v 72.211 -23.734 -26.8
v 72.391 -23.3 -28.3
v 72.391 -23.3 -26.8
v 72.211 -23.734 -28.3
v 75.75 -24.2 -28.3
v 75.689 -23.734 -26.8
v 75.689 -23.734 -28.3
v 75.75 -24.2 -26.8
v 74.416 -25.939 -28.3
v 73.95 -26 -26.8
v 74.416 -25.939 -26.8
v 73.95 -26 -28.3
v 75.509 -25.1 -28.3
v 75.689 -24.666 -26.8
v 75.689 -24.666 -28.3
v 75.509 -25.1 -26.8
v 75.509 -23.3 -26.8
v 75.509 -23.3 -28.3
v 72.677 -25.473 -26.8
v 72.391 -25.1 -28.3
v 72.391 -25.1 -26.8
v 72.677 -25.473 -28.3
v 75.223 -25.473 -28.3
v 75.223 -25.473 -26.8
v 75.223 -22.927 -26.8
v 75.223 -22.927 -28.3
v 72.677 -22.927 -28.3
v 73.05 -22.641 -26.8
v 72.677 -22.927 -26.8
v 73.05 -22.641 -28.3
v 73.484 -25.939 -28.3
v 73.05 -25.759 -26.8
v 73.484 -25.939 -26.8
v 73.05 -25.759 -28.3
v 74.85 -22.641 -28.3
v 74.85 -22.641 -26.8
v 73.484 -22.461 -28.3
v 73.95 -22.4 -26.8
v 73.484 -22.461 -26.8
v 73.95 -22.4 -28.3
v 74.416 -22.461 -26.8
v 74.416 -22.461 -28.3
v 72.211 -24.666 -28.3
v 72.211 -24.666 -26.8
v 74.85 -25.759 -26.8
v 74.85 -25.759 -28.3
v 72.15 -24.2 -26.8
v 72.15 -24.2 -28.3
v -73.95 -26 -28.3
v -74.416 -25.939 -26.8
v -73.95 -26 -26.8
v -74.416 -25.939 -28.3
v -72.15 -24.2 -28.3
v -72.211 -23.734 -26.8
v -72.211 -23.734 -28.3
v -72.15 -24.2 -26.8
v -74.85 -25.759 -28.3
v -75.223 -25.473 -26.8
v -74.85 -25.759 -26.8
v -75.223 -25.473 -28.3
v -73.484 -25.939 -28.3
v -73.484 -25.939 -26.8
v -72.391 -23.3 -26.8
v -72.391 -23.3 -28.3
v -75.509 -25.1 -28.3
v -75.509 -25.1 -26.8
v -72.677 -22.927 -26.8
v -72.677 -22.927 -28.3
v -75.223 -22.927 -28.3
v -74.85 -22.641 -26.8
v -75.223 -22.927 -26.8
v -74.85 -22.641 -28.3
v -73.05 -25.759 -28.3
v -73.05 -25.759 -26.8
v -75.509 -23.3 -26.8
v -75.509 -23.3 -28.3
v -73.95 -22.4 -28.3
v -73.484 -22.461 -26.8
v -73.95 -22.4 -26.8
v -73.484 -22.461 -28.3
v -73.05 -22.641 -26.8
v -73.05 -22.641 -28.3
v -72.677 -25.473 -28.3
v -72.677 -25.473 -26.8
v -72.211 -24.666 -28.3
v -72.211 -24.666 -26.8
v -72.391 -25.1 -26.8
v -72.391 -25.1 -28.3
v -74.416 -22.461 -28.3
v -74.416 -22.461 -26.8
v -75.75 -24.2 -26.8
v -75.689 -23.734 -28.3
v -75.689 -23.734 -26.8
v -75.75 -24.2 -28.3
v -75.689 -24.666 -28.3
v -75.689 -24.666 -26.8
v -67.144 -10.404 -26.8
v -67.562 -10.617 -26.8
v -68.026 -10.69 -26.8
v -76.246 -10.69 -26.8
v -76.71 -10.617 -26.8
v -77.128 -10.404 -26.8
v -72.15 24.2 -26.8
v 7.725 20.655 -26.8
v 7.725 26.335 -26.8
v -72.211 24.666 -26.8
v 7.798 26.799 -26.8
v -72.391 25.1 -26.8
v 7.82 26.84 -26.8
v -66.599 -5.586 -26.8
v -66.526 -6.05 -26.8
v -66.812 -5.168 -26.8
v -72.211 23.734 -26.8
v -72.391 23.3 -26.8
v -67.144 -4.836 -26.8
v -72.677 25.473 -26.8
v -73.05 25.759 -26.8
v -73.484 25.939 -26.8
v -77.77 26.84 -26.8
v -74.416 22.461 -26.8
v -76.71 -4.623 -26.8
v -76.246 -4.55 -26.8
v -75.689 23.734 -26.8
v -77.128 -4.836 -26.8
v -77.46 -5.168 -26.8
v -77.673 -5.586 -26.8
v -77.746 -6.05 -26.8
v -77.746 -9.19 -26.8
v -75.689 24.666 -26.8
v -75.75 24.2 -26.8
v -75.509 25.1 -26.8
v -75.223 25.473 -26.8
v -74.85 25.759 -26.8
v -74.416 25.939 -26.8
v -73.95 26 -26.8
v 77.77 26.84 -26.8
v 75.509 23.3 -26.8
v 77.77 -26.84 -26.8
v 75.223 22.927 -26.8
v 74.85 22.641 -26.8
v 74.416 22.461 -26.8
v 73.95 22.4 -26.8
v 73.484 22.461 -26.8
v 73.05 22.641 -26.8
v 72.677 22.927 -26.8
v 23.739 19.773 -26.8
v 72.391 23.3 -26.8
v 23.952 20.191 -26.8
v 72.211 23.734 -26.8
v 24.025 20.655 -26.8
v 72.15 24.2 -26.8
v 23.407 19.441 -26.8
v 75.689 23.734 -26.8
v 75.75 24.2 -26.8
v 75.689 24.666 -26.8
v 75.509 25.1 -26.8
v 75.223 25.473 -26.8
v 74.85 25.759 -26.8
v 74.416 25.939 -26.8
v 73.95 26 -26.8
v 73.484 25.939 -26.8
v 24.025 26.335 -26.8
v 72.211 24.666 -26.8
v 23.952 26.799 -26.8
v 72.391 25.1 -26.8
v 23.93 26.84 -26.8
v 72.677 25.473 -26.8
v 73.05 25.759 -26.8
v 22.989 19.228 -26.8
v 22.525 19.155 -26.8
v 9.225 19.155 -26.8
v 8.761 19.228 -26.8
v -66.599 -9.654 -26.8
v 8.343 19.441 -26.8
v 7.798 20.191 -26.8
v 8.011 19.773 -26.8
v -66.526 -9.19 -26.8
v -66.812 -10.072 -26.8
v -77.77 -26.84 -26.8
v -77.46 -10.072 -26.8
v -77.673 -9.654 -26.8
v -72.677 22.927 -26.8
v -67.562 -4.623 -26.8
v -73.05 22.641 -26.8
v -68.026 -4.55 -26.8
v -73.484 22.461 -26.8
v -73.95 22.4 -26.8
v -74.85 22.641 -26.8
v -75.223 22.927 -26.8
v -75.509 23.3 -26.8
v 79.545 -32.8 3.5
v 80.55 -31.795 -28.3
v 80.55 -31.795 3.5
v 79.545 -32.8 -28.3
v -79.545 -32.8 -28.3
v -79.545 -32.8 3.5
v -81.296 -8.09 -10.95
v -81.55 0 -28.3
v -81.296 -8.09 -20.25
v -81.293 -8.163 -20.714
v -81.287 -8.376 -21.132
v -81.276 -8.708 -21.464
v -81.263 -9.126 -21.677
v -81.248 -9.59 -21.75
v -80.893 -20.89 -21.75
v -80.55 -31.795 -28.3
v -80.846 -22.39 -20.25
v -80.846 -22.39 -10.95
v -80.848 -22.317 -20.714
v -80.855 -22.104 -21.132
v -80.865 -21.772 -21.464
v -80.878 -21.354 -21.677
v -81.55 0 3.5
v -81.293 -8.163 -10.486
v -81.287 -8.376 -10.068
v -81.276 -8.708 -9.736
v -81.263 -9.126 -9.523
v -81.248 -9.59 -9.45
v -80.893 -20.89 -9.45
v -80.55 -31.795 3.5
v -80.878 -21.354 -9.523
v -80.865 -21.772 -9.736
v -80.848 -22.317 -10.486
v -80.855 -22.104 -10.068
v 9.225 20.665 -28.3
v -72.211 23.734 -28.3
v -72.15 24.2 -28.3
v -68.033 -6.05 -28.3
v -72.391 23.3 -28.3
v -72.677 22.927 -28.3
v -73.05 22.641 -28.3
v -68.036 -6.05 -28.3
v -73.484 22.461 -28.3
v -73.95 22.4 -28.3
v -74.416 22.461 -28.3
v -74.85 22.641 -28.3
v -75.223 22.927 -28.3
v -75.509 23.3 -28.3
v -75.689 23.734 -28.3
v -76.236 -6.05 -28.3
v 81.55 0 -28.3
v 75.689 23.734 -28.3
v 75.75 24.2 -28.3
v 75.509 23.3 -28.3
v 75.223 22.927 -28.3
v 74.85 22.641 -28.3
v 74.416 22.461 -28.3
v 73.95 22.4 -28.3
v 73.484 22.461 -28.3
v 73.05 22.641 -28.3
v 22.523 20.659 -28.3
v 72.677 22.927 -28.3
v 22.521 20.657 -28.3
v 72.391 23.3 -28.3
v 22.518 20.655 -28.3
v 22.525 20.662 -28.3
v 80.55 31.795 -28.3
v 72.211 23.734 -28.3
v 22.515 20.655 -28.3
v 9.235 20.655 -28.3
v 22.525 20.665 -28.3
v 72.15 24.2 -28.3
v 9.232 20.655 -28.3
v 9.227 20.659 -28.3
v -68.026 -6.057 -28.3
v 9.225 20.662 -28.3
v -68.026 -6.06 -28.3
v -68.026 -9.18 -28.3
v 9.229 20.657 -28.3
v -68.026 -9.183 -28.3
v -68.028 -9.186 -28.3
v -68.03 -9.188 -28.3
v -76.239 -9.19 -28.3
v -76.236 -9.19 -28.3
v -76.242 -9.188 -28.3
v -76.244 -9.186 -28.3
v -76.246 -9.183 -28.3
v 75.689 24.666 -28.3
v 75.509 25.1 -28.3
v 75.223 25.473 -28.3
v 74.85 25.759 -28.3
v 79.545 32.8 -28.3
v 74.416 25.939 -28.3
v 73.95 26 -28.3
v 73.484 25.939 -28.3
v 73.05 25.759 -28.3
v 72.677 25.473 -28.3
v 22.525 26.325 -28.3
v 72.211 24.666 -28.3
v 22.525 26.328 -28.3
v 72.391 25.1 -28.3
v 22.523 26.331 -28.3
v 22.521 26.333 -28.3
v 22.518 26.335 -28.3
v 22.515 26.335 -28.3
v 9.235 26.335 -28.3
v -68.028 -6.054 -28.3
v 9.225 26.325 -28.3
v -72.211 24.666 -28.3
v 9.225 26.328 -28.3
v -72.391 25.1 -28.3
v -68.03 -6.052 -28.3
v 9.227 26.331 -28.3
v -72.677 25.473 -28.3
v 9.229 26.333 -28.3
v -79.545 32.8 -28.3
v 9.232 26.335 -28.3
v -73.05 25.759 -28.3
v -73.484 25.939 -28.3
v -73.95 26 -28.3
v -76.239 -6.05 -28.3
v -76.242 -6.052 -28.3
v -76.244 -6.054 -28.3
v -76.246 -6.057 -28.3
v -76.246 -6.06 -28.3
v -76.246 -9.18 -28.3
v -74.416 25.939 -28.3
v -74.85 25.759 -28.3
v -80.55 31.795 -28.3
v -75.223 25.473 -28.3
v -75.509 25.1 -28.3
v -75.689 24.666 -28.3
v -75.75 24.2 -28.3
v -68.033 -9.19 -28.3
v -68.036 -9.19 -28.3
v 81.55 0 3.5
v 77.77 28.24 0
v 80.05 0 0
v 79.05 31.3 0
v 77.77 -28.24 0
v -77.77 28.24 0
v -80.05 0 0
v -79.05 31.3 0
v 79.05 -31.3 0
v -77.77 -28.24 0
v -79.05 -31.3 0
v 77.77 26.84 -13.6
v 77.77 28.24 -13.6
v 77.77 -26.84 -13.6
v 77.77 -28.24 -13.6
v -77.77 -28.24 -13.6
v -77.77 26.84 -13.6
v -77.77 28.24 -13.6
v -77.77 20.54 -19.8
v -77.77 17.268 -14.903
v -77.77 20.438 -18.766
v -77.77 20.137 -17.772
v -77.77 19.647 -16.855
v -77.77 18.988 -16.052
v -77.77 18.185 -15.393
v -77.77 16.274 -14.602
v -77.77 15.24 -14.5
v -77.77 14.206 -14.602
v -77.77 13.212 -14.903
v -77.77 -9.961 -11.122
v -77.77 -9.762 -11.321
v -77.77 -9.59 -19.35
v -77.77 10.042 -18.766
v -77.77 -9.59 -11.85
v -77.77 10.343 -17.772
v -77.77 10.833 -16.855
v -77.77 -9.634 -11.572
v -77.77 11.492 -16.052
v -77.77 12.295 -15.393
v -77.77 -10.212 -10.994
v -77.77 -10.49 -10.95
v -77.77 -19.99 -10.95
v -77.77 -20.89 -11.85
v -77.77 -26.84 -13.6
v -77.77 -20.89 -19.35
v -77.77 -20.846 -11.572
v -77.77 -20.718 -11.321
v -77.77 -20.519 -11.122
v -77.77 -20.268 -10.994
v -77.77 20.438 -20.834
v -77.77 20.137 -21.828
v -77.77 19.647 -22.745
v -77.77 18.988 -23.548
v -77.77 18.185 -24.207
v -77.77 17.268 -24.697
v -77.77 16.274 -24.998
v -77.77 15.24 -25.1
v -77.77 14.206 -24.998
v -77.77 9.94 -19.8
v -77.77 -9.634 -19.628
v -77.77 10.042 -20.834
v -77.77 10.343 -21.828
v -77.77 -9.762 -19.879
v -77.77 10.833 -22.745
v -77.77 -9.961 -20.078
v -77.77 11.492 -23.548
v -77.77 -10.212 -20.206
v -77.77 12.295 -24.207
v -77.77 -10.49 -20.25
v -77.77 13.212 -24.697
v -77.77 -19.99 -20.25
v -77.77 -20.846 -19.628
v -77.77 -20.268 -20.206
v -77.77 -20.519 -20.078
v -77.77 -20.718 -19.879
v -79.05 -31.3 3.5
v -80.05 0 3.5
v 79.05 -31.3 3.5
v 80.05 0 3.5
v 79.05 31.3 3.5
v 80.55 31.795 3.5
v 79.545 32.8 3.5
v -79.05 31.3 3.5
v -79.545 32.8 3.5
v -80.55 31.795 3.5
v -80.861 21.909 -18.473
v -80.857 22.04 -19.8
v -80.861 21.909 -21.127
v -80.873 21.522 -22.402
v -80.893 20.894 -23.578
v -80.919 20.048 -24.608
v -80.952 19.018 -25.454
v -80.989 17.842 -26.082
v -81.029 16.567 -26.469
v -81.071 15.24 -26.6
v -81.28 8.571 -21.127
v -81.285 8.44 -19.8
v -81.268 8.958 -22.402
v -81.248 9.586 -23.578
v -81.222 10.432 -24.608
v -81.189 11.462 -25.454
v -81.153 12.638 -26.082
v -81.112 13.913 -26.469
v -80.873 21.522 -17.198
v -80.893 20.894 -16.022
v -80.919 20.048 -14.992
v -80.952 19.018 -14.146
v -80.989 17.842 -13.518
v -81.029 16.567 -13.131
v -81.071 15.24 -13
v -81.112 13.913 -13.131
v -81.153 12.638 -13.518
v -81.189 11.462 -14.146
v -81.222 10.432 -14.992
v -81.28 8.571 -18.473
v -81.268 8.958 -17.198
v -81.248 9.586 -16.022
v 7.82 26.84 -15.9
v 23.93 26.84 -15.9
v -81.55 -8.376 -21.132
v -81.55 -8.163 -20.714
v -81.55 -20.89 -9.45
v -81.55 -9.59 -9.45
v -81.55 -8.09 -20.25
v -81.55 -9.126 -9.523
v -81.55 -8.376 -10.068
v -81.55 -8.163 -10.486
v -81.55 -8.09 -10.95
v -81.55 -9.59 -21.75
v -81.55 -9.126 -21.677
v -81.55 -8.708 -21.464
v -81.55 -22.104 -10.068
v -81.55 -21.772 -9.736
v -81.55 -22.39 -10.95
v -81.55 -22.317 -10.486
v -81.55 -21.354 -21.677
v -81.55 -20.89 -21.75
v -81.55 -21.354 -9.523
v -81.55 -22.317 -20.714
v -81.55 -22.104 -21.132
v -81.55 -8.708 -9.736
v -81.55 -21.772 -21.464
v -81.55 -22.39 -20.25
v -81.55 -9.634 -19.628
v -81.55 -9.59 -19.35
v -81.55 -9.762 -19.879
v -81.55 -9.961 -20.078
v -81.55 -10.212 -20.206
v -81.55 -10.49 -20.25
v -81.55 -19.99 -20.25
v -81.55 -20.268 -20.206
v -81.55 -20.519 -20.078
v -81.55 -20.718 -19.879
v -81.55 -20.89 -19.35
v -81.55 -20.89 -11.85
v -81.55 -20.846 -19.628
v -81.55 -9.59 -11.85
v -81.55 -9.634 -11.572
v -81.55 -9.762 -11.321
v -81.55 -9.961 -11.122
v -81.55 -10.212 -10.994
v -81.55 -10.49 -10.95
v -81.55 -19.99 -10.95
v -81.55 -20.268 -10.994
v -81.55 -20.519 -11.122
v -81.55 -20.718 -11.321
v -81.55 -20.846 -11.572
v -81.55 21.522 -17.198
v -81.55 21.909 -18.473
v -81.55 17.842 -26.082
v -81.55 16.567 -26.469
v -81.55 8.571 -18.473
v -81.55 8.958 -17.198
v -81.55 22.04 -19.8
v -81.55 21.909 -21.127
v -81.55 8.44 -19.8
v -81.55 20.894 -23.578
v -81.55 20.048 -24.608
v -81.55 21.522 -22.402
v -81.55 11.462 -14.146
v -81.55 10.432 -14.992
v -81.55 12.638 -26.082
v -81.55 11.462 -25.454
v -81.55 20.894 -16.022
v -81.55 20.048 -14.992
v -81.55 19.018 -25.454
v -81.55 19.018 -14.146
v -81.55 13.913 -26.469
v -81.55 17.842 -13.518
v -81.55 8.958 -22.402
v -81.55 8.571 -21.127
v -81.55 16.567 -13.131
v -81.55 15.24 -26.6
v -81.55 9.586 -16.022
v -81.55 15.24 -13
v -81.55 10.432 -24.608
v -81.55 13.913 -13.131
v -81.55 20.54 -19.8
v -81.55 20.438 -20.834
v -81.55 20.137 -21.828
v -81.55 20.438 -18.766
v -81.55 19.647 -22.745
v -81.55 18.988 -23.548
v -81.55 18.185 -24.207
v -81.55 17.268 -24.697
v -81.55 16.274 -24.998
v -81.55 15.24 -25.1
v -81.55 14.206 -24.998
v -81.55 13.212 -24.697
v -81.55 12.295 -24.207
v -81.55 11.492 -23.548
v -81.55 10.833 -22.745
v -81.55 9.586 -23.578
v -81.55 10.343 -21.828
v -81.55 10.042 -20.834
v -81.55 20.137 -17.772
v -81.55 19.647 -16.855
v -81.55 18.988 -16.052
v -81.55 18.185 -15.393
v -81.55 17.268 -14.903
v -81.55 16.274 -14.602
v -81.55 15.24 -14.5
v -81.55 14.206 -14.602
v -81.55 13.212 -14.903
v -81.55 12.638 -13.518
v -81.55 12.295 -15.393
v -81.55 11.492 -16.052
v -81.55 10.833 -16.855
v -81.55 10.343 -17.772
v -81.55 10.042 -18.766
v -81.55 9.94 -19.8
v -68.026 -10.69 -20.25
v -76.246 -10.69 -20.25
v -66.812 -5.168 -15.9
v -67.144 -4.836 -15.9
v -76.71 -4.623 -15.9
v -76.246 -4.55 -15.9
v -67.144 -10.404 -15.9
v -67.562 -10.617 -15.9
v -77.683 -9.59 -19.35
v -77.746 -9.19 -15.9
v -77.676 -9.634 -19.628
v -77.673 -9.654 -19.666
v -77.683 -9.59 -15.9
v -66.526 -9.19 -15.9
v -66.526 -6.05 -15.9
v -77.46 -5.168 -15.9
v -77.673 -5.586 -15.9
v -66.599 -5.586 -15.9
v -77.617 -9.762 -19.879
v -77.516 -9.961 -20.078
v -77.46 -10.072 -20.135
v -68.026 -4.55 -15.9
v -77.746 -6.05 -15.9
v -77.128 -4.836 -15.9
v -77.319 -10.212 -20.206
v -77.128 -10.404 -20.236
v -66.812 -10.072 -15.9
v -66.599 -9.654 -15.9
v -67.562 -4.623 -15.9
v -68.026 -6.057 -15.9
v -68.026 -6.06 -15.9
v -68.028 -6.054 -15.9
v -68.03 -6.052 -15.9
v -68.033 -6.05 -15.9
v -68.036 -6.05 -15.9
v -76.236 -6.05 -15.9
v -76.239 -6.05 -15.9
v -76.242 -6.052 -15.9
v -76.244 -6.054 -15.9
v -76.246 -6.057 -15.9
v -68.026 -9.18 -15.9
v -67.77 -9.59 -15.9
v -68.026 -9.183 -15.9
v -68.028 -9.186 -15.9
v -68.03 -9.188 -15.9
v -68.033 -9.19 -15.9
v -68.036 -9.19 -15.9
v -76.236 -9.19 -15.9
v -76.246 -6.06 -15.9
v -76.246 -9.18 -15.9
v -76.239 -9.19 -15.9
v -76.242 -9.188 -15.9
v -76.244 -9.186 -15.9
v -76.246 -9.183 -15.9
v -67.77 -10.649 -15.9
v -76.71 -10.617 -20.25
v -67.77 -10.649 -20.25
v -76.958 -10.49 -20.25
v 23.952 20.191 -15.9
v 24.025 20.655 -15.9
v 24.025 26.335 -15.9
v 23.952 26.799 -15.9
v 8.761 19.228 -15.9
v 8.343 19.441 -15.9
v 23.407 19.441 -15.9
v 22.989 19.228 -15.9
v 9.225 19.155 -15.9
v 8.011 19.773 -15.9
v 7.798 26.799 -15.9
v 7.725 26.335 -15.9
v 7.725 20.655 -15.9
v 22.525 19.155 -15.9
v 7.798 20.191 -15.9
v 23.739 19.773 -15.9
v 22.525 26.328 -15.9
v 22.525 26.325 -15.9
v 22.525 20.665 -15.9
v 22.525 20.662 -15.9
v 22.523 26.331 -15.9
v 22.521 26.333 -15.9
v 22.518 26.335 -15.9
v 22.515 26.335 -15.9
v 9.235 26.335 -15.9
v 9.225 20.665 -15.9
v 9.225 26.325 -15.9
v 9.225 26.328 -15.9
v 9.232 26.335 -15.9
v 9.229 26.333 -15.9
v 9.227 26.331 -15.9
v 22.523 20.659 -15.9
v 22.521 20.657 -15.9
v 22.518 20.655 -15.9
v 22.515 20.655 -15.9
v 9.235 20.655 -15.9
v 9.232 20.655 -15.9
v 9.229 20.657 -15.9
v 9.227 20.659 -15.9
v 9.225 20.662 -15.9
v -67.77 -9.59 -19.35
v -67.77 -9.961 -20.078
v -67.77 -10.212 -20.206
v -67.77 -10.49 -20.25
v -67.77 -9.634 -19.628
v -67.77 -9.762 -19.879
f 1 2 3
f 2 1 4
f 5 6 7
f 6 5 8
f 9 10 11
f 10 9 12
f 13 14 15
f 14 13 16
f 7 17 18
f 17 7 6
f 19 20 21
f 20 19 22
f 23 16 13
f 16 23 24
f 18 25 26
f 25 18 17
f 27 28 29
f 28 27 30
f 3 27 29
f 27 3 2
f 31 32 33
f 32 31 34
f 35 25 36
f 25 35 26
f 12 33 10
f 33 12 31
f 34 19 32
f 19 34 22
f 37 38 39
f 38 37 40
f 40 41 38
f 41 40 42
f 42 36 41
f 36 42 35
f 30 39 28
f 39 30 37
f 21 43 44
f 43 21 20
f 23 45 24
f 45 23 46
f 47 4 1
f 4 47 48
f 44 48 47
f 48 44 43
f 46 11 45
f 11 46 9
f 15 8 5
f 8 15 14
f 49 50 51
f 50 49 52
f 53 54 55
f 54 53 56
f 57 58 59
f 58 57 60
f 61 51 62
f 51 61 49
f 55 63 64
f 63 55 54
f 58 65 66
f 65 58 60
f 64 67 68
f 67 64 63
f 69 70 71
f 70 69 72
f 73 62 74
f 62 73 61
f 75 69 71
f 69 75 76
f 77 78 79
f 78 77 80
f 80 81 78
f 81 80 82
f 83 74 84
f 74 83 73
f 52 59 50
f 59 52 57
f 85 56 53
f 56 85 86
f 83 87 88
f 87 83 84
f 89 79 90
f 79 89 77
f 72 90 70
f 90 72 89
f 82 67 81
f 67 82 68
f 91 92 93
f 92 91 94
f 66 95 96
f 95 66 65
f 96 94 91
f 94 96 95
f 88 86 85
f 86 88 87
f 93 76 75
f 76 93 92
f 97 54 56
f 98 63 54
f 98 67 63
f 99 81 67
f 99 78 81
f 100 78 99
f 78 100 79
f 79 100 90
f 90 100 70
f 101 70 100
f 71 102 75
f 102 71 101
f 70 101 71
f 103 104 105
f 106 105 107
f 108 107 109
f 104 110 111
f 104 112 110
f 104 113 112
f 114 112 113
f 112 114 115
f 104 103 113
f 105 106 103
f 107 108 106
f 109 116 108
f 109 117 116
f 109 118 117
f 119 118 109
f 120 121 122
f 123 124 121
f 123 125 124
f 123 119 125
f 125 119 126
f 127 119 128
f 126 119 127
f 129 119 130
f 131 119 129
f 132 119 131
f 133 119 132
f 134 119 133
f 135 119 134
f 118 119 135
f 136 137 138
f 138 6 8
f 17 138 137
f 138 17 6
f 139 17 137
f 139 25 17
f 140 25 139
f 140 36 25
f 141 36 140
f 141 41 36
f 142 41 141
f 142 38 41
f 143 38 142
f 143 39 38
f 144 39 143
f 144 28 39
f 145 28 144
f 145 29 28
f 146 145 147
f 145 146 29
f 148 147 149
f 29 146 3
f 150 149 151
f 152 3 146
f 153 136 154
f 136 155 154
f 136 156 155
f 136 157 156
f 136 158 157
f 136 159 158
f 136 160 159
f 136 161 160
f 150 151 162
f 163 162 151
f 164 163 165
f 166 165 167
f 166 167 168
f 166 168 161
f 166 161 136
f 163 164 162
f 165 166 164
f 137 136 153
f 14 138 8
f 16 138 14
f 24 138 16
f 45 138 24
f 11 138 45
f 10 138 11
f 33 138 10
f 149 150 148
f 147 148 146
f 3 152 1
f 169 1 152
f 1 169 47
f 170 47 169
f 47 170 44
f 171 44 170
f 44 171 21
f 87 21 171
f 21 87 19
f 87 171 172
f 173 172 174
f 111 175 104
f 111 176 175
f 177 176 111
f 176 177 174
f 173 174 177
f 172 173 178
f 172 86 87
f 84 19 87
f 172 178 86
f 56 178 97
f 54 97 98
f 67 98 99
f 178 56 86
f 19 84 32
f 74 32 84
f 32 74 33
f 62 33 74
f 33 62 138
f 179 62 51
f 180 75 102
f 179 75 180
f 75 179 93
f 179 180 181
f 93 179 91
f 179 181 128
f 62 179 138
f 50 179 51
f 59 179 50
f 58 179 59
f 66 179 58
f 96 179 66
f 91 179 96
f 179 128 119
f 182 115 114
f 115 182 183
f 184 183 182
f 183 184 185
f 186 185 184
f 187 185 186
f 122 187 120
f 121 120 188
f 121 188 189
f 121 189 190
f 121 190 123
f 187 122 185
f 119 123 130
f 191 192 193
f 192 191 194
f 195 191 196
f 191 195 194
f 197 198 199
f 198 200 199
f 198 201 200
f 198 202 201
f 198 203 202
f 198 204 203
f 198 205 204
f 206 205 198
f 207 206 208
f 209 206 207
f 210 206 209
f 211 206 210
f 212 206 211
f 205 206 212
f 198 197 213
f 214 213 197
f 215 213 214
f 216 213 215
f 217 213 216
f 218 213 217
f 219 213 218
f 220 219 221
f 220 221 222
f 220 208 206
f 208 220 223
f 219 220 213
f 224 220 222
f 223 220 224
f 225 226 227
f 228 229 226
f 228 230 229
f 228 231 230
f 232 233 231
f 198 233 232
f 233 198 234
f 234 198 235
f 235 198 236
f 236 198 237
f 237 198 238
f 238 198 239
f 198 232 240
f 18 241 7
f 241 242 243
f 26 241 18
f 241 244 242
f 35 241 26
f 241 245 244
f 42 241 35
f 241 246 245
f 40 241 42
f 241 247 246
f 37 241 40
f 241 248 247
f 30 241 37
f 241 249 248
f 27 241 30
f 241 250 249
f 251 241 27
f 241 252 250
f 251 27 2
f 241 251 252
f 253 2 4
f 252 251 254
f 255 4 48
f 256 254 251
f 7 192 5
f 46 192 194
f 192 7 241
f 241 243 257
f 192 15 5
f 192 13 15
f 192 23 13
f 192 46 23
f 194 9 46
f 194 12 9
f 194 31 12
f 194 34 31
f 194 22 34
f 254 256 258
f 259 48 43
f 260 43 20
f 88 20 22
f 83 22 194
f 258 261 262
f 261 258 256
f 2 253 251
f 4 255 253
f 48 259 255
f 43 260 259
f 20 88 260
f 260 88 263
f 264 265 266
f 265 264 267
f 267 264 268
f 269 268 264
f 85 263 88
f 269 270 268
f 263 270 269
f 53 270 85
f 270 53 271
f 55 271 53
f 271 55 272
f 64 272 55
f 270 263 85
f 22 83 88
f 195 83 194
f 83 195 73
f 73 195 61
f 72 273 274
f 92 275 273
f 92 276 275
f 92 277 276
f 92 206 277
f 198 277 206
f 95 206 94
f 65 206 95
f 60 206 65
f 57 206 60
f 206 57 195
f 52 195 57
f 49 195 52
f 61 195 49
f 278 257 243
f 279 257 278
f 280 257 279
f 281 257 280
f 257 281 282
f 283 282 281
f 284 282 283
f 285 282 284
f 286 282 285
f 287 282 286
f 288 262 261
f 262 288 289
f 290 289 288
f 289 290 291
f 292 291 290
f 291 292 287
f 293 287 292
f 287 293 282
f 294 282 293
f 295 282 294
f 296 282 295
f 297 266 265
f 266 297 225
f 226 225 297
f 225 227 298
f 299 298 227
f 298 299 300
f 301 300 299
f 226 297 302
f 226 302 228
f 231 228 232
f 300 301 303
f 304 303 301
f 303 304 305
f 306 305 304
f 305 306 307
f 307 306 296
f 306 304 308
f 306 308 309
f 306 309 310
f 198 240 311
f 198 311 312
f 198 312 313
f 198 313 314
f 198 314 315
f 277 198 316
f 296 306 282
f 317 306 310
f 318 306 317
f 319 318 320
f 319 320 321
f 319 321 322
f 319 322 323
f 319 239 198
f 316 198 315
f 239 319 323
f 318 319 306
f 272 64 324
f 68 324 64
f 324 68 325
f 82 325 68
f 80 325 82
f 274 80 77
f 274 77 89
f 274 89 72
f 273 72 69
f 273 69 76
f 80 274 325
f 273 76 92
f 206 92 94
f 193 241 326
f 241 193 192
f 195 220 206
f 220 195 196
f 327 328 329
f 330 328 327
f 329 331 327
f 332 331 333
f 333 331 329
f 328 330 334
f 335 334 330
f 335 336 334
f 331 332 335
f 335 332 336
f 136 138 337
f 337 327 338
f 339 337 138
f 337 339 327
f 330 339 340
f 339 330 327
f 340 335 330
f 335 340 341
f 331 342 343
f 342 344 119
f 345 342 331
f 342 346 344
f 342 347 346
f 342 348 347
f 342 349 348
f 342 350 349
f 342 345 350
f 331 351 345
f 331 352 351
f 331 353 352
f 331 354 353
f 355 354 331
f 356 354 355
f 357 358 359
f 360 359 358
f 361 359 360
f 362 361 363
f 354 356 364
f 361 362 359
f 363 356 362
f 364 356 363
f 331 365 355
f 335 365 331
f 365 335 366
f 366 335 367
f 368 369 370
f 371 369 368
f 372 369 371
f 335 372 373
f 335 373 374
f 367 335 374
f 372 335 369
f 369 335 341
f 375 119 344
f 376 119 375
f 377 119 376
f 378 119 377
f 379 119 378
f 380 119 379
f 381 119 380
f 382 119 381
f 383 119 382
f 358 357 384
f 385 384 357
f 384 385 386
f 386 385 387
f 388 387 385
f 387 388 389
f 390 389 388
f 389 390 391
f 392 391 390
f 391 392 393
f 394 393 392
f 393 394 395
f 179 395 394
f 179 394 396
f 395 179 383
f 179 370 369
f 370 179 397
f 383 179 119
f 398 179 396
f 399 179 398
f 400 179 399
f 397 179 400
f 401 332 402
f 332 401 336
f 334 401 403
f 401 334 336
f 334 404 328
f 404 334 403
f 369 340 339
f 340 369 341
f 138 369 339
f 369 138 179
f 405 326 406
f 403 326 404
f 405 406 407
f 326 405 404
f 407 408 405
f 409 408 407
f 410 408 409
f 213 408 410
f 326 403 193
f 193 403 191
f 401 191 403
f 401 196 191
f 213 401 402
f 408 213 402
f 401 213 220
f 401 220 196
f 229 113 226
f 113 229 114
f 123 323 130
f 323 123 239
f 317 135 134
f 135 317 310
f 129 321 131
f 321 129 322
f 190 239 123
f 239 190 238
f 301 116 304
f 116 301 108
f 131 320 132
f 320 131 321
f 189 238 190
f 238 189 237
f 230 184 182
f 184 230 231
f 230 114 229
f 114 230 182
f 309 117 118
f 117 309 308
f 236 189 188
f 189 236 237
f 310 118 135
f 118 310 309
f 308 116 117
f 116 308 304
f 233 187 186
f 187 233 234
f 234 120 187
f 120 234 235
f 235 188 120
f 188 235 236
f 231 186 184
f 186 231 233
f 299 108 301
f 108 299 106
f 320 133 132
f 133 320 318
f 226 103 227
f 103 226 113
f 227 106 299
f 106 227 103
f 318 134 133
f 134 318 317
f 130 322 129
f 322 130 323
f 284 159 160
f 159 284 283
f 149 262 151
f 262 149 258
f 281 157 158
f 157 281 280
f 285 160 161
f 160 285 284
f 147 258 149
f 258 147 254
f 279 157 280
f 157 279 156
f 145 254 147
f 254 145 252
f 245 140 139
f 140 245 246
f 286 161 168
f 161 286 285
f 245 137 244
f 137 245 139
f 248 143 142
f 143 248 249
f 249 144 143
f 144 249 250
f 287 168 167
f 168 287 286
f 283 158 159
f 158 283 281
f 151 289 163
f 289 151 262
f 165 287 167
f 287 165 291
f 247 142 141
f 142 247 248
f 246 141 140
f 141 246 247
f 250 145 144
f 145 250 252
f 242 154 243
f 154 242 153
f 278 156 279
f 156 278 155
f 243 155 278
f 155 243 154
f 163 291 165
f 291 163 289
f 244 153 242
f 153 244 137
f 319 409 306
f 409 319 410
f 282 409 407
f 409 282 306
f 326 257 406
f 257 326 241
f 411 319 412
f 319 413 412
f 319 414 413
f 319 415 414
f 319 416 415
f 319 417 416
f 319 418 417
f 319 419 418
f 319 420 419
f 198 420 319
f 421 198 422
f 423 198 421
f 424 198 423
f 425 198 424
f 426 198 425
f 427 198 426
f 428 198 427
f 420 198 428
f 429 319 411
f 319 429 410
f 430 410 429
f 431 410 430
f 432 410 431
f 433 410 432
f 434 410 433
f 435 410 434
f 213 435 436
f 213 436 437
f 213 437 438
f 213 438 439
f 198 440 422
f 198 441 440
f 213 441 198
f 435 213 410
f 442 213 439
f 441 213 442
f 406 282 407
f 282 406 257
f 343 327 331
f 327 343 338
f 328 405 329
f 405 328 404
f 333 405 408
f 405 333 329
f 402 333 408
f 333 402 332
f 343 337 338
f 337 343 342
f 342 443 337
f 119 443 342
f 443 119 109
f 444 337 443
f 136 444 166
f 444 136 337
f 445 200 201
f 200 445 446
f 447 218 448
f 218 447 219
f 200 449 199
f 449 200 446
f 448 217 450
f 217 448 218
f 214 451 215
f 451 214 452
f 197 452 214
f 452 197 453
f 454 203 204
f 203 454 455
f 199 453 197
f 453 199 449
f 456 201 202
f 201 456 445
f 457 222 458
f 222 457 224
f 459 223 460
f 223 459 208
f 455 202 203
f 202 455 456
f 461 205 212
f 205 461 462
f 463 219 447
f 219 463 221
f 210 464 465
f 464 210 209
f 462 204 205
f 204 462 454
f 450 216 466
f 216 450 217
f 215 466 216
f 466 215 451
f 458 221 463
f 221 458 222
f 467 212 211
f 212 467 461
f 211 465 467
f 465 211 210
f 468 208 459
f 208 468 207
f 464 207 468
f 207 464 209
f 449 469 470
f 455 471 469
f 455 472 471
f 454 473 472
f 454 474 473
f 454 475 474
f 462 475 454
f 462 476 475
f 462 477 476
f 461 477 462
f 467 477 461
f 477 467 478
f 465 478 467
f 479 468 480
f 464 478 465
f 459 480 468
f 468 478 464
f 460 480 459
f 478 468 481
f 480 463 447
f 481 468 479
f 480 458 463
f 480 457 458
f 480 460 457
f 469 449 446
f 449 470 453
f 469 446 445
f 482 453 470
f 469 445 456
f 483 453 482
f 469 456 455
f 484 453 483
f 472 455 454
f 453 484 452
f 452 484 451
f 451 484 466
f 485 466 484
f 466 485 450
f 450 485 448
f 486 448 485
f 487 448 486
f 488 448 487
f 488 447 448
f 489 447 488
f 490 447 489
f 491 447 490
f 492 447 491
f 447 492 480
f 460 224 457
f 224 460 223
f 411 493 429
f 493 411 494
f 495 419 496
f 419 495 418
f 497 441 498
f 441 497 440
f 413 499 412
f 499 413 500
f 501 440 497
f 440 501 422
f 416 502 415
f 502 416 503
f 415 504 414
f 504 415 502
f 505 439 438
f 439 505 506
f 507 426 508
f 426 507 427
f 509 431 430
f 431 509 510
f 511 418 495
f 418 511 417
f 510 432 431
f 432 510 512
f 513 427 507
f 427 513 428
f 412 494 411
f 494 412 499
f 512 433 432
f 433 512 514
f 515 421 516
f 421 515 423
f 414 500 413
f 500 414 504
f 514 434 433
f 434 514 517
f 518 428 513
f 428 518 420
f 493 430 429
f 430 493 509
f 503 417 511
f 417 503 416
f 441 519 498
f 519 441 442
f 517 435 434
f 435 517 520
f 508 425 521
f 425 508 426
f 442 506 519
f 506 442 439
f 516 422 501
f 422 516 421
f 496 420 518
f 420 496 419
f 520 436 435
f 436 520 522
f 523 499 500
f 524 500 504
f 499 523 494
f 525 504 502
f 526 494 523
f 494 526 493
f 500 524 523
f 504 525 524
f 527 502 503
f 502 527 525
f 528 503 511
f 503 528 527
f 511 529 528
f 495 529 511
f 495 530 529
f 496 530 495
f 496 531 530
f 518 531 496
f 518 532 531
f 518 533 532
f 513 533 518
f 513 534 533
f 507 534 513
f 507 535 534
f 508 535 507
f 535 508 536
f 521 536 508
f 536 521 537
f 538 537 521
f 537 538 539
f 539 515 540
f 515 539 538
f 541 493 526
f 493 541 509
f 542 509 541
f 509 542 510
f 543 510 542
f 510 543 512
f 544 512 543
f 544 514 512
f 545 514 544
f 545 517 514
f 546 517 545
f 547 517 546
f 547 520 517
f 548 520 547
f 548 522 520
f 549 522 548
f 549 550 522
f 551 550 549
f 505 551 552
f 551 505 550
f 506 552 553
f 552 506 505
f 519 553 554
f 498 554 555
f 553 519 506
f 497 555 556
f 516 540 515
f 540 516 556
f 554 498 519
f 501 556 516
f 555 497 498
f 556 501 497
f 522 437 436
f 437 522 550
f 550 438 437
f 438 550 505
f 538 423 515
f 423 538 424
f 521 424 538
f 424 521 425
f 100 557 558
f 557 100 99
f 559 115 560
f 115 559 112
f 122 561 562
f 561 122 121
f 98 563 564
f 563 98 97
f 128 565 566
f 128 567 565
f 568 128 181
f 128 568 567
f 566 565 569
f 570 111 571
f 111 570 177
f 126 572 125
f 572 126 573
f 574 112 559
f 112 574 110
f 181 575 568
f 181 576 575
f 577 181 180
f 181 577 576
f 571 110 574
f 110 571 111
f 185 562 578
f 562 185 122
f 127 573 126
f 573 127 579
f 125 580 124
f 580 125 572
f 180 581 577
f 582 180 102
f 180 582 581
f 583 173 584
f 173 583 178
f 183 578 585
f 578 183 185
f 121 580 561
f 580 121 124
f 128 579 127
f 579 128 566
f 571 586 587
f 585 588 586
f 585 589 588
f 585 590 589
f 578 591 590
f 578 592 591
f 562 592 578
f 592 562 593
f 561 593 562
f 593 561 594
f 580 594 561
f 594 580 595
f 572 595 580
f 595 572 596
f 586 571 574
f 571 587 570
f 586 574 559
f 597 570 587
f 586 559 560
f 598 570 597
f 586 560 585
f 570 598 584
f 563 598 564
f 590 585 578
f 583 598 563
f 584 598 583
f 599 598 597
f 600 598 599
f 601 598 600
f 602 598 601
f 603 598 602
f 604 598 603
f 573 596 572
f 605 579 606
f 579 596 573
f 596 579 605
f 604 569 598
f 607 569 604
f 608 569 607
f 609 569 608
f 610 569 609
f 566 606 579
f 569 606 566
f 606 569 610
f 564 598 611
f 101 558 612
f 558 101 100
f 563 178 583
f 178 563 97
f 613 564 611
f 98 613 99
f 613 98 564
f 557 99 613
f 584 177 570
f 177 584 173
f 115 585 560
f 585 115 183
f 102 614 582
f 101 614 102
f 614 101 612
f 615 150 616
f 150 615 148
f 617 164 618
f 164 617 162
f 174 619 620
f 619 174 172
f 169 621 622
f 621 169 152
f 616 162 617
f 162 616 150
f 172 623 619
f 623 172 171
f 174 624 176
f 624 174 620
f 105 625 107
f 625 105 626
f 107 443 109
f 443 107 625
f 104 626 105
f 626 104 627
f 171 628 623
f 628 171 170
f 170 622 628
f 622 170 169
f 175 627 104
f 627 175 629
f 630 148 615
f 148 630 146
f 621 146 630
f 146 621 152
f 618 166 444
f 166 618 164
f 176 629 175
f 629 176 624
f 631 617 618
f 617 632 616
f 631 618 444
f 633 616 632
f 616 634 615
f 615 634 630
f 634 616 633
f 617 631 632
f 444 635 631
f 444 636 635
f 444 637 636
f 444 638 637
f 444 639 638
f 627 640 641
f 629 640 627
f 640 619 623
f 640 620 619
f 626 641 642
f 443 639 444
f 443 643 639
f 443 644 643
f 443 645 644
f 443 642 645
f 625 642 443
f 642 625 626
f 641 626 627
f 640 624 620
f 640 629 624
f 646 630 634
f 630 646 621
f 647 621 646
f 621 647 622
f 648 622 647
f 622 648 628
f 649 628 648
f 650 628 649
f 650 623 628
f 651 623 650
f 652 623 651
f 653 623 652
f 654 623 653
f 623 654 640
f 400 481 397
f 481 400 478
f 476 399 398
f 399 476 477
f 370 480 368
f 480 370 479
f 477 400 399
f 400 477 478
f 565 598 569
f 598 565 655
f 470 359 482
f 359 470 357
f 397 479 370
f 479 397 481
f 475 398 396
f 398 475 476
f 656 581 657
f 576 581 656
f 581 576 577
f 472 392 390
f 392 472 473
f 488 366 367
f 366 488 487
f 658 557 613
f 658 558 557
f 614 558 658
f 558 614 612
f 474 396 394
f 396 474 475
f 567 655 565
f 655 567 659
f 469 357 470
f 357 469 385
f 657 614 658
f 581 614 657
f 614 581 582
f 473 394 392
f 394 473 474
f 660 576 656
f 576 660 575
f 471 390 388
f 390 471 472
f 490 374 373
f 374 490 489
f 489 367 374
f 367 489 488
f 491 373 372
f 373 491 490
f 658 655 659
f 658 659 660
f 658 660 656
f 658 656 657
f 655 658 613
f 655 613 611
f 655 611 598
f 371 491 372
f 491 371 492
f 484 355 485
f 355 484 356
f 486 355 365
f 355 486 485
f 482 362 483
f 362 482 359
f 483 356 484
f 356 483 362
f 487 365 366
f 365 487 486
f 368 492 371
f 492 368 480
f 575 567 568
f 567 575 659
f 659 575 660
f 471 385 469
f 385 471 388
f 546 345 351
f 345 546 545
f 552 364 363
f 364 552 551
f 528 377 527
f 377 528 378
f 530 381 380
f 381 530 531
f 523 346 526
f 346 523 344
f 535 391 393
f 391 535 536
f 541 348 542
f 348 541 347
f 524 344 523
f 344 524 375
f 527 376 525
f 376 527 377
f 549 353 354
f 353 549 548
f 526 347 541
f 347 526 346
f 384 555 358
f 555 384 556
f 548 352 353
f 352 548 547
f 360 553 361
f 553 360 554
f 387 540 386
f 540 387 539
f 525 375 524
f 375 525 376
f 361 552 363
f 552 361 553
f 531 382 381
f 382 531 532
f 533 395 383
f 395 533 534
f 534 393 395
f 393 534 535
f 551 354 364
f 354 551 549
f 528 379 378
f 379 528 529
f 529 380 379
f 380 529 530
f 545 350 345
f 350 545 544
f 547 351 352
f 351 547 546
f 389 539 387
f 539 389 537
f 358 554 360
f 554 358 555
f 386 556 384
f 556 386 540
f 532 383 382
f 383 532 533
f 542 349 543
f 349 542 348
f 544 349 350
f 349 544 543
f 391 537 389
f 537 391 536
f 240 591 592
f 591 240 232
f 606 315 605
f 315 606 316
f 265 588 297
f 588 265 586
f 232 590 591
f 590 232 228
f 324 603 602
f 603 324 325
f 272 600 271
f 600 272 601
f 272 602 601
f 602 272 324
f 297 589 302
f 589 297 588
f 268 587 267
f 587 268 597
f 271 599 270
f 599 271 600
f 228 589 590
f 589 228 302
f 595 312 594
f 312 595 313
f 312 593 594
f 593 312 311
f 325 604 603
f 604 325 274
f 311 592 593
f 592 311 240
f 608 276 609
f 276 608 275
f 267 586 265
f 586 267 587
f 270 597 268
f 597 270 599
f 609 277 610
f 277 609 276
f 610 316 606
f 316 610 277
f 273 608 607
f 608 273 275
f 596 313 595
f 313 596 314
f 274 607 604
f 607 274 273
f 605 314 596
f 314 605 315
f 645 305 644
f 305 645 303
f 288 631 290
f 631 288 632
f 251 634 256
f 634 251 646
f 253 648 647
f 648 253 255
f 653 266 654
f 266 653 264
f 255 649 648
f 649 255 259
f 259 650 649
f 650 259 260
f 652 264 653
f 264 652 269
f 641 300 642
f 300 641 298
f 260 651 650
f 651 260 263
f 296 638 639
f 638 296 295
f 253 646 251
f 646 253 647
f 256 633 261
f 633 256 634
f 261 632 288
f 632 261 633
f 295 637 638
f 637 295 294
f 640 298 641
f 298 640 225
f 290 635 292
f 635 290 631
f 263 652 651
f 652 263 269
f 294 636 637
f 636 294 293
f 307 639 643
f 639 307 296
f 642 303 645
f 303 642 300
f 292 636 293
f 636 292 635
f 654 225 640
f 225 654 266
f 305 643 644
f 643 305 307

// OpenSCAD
// case for FG085 signal generator
//
// design origin is center inside of front panel

part = "shell";  // [ shell, demo ]
with_tubes = 0; // [ 1:true, 0:false ]
with_u5p = 0; // [ 1:true, 0:false ]
with_u6p = 1; // [ 1:true, 0:false ]
with_pwm = 1; // [ 1:true, 0:false ]
with_usb = 1; // [ 1:true, 0:false ]

/* [Hidden] */
function in2mm(a) = a * 25.4;

panel_width = 157.5; // at base BUG: accurate?
panel_height = 62.0; 
panel_wall = 2.0;
panel_delta_w = 1.0; // extra width at middle of sides
pcb_thickness = 1.6;
pcb_width = in2mm(6.100); 
pcb_height = in2mm(2.200); 
spacer_front = 12.0; // the spacer with the threads, placed behind front panel and pcb
spacer_rear = 13.2; // placed on rear of pcb
panel_dist = spacer_front + pcb_thickness + spacer_rear; // between panels
screw_thread = 3.0;
nut_af = 4.65; // across flats
nut_dia = 5.3; // to clear
screw_dx = 144.3 + 3.6; // mounting hole distances
screw_dy = 44.8 + 3.6;

power_dia = 10.0; // dia of plug body  
power_pos_z = pcb_height/2 - in2mm(0.500); // offset from middle of PCB
power_pos_y = 6.2; // height from PCB surface
usb_width = 11.0; // plug body
usb_height = 9.0; // plug body
usb_pos_z = -(pcb_height/2 - in2mm(0.500)); // offset from middle of PCB
usb_pos_y = 2.0; // height from PCB surface

pwm_pos_z = -(pcb_height/2 - in2mm(0.800)); // offset from middle of PCB
pwm_pos_x = -(pcb_width/2 - in2mm(0.210)); 
u6p_pos_z = pcb_height/2 - in2mm(0.075) - in2mm(0.100);
u6p_pos_x = pcb_width/2 - in2mm(2.675) + in2mm(0.500)/2;
u5p_pos_z = u6p_pos_z;
u5p_pos_x = pcb_width/2 - in2mm(3.500) + in2mm(0.500)/2;

// tunable
support = 0.4; // needs to be wider than nozzle
wall = 1.5;
chamfer = wall*0.67;
tol = 0.3;
d = 0.01;

if (part == "demo") {
    if (false) color([0, 0.5, 0, 0.3]) {
        panel(0); // front
        translate([0, panel_wall+panel_dist, 0]) panel(0); // rear
    }
    shell();
}  

if (part == "shell") {
    rotate([-90, 0, 0]) shell();
}  

module shell() {
    module power(is_tube) {
        translate([-(pcb_width/2+tol)+(is_tube?0:10), spacer_front + pcb_thickness + power_pos_y, power_pos_z]) rotate([0, -90, 0]) 
            cylinder(r=power_dia/2 + tol + (is_tube?wall : 0), h=panel_delta_w+wall+(panel_width-pcb_width)/2+(is_tube?0:10+d), $fn=32);
    }
    module usb(is_tube) {
        if (with_usb) translate([-(pcb_width/2+tol)+(is_tube?0:10), spacer_front + pcb_thickness + usb_pos_y, usb_pos_z]) rotate([0, -90, 0]) 
            cr_cube(usb_width+tol+(is_tube?2*wall:0), 
                    usb_height+tol+(is_tube?2*wall : 0), 
                    panel_delta_w+wall+(panel_width-pcb_width)/2+(is_tube?0:10+d), 
                    (is_tube?wall:wall*0.6));
    }
    module rearconn(is_tube, dx, dz, nx, nz) {
        translate([dx, panel_dist + wall + (is_tube?0:d), dz]) rotate([90, 0, 0]) 
            cr_cube(nx*in2mm(0.1)+2*tol+(is_tube?2*wall:0), 
                    nz*in2mm(0.1)+2*tol+(is_tube?2*wall:0), 
                    wall+spacer_rear-2.0-tol+(is_tube?0:d+d), 
                    (is_tube?wall:d));
    }
    module conns(is_tube) {
        usb(is_tube);
        power(is_tube);
        if (with_pwm) rearconn(is_tube, pwm_pos_x, pwm_pos_z, 3, 1);
        if (with_u5p) rearconn(is_tube, u5p_pos_x, u5p_pos_z, 5, 2);
        if (with_u6p) rearconn(is_tube, u6p_pos_x, u6p_pos_z, 5, 2);
    }

    difference () {
        union ( ){
            halfshell();
            rotate([0, 180, 0]) halfshell();
            conns(true);
        }
        union ( ){
            conns(false);
        }
    } 
}

module halfshell() { // half shell

    // inner frame around PCB
    translate([0, panel_dist, 0]) rotate([90, 0, 0]) {
        linear_extrude(panel_dist) polygon([       
        [-(pcb_width/2+tol), 0],
        [-(pcb_width/2+tol), -(pcb_height/2+tol)],
        [pcb_width/2+tol, -(pcb_height/2+tol)], 
        [pcb_width/2+tol, 0],
        [panel_width/2+panel_delta_w+tol, 0],
        [panel_width/2+tol, -(panel_height/2+tol)],
        [-(panel_width/2+tol), -(panel_height/2+tol)],        
        [-(panel_width/2+panel_delta_w+tol), 0]]);
    }
    // support under pcb, 1.1 mm thick
    translate([0, panel_dist, 0]) rotate([90, 0, 0]) {
        linear_extrude(spacer_rear) polygon([       
            [-panel_width/2-tol, -pcb_height/2 + 1.1],
            [-panel_width/2-tol, -panel_height/2+wall],
            [panel_width/2+tol, -panel_height/2+wall],
            [panel_width/2+tol, -pcb_height/2 + 1.1]]);
    }
    // side walls
    translate([0, panel_dist+wall, 0]) rotate([90, 0, 0]) {
       linear_extrude(2*wall+panel_wall+panel_dist) polygon([       
       [-panel_width/2-panel_delta_w-tol, 0],
       [-panel_width/2-tol, -(panel_height/2+tol)],
       [panel_width/2+tol, -(panel_height/2+tol)], 
       [panel_width/2+panel_delta_w+tol, 0],
       [panel_width/2+panel_delta_w+tol+wall, 0],
       [panel_width/2+tol+wall, -panel_height/2-tol-wall+chamfer],
       [panel_width/2+tol+wall-chamfer, -panel_height/2-tol-wall],
       [-panel_width/2-tol-wall+chamfer, -panel_height/2-tol-wall],  
       [-panel_width/2-tol-wall, -panel_height/2-tol-wall+chamfer],      
       [-panel_width/2-panel_delta_w-tol-wall, 0]]);
    }
    // bottom
    difference () {
        translate([0, panel_dist+wall, 0]) rotate([90, 0, 0]) {
           linear_extrude(wall) polygon([       
           [panel_width/2+panel_delta_w+tol+wall, 0],
           [panel_width/2+tol+wall, -panel_height/2-tol-wall+chamfer],
           [panel_width/2+tol+wall-chamfer, -panel_height/2-tol-wall],
           [-panel_width/2-tol-wall+chamfer, -panel_height/2-tol-wall],  
           [-panel_width/2-tol-wall, -panel_height/2-tol-wall+chamfer],      
           [-panel_width/2-panel_delta_w-tol-wall, 0]]);
        }
        translate([0, panel_dist+wall+d, 0]) for (dx = [1, -1]) rotate([90, 0, 0])         translate([dx*screw_dx/2, -screw_dy/2, 0]) cylinder(r=screw_thread/2+tol, h=wall+2*d, $fn=24);
   }
        

   // tubes for screws
   dz = -panel_dist; 
   if (with_tubes) for (dx = [1, -1]) rotate([90, 0, 0]) translate([dx*screw_dx/2, -screw_dy/2, dz]) {
       difference () {
           union () {
               cylinder(r=nut_dia/2+tol/2+wall, h=spacer_rear, $fn=24);
               translate([0, -(panel_height-screw_dy)/4, 0]) c_cube(nut_dia+tol+2*wall, (panel_height-screw_dy)/2, spacer_rear);
               translate([dx*(panel_width-screw_dx)/4, 0, 0]) c_cube((panel_width-screw_dx)/2, nut_dia+tol+2*wall, spacer_rear);
           }
           rotate([0, 0, 30]) translate([0, 0, -d]) cylinder(r=nut_dia/2 + tol/2, h=spacer_rear+2*d, $fn=66);
       }
   }
 
} 
    
module panel(air)
{
   difference() {
        rotate([90, 0, 0]) {
            translate([0, 0, -air]) linear_extrude(panel_wall+2*air) polygon([
            [-panel_width/2-panel_delta_w-air, 0], 
            [-panel_width/2-air, panel_height/2+air], 
            [panel_width/2+air, panel_height/2+air],  
            [panel_width/2+panel_delta_w+air, 0], 
            [panel_width/2+air, -panel_height/2-air],
            [-panel_width/2-air, -panel_height/2-air]]);
       }
       union() {
           for (dx = [1, -1]) for (dy = [1, -1]) rotate([90, 0, 0]) translate([dx*screw_dx/2, dy*screw_dy/2, -d]) cylinder(r=3.0/2, h=2*d+panel_wall, $fn=12);
       }
   }
}    
    
    module c_cube(x, y, z) {
	translate([-x/2, -y/2, 0]) cube([x, y, z]);
}

module cr_cube(x, y, z, r) {
	hull() {
		for (dx=[-1,1]) for (dy=[-1,1]) translate([dx*(x/2-r), dy*(y/2-r), 0]) cylinder(r=r, h=z, $fn=20);
	}
}

module cr2_cube(x, y, z, r1, r2) {
	hull() {
		for (dx=[-1,1]) for (dy=[-1,1]) translate([dx*(x/2-r1), dy*(y/2-r1), 0]) cylinder(r1=r1, r2=r2, h=z, $fn=20);
	}
}
